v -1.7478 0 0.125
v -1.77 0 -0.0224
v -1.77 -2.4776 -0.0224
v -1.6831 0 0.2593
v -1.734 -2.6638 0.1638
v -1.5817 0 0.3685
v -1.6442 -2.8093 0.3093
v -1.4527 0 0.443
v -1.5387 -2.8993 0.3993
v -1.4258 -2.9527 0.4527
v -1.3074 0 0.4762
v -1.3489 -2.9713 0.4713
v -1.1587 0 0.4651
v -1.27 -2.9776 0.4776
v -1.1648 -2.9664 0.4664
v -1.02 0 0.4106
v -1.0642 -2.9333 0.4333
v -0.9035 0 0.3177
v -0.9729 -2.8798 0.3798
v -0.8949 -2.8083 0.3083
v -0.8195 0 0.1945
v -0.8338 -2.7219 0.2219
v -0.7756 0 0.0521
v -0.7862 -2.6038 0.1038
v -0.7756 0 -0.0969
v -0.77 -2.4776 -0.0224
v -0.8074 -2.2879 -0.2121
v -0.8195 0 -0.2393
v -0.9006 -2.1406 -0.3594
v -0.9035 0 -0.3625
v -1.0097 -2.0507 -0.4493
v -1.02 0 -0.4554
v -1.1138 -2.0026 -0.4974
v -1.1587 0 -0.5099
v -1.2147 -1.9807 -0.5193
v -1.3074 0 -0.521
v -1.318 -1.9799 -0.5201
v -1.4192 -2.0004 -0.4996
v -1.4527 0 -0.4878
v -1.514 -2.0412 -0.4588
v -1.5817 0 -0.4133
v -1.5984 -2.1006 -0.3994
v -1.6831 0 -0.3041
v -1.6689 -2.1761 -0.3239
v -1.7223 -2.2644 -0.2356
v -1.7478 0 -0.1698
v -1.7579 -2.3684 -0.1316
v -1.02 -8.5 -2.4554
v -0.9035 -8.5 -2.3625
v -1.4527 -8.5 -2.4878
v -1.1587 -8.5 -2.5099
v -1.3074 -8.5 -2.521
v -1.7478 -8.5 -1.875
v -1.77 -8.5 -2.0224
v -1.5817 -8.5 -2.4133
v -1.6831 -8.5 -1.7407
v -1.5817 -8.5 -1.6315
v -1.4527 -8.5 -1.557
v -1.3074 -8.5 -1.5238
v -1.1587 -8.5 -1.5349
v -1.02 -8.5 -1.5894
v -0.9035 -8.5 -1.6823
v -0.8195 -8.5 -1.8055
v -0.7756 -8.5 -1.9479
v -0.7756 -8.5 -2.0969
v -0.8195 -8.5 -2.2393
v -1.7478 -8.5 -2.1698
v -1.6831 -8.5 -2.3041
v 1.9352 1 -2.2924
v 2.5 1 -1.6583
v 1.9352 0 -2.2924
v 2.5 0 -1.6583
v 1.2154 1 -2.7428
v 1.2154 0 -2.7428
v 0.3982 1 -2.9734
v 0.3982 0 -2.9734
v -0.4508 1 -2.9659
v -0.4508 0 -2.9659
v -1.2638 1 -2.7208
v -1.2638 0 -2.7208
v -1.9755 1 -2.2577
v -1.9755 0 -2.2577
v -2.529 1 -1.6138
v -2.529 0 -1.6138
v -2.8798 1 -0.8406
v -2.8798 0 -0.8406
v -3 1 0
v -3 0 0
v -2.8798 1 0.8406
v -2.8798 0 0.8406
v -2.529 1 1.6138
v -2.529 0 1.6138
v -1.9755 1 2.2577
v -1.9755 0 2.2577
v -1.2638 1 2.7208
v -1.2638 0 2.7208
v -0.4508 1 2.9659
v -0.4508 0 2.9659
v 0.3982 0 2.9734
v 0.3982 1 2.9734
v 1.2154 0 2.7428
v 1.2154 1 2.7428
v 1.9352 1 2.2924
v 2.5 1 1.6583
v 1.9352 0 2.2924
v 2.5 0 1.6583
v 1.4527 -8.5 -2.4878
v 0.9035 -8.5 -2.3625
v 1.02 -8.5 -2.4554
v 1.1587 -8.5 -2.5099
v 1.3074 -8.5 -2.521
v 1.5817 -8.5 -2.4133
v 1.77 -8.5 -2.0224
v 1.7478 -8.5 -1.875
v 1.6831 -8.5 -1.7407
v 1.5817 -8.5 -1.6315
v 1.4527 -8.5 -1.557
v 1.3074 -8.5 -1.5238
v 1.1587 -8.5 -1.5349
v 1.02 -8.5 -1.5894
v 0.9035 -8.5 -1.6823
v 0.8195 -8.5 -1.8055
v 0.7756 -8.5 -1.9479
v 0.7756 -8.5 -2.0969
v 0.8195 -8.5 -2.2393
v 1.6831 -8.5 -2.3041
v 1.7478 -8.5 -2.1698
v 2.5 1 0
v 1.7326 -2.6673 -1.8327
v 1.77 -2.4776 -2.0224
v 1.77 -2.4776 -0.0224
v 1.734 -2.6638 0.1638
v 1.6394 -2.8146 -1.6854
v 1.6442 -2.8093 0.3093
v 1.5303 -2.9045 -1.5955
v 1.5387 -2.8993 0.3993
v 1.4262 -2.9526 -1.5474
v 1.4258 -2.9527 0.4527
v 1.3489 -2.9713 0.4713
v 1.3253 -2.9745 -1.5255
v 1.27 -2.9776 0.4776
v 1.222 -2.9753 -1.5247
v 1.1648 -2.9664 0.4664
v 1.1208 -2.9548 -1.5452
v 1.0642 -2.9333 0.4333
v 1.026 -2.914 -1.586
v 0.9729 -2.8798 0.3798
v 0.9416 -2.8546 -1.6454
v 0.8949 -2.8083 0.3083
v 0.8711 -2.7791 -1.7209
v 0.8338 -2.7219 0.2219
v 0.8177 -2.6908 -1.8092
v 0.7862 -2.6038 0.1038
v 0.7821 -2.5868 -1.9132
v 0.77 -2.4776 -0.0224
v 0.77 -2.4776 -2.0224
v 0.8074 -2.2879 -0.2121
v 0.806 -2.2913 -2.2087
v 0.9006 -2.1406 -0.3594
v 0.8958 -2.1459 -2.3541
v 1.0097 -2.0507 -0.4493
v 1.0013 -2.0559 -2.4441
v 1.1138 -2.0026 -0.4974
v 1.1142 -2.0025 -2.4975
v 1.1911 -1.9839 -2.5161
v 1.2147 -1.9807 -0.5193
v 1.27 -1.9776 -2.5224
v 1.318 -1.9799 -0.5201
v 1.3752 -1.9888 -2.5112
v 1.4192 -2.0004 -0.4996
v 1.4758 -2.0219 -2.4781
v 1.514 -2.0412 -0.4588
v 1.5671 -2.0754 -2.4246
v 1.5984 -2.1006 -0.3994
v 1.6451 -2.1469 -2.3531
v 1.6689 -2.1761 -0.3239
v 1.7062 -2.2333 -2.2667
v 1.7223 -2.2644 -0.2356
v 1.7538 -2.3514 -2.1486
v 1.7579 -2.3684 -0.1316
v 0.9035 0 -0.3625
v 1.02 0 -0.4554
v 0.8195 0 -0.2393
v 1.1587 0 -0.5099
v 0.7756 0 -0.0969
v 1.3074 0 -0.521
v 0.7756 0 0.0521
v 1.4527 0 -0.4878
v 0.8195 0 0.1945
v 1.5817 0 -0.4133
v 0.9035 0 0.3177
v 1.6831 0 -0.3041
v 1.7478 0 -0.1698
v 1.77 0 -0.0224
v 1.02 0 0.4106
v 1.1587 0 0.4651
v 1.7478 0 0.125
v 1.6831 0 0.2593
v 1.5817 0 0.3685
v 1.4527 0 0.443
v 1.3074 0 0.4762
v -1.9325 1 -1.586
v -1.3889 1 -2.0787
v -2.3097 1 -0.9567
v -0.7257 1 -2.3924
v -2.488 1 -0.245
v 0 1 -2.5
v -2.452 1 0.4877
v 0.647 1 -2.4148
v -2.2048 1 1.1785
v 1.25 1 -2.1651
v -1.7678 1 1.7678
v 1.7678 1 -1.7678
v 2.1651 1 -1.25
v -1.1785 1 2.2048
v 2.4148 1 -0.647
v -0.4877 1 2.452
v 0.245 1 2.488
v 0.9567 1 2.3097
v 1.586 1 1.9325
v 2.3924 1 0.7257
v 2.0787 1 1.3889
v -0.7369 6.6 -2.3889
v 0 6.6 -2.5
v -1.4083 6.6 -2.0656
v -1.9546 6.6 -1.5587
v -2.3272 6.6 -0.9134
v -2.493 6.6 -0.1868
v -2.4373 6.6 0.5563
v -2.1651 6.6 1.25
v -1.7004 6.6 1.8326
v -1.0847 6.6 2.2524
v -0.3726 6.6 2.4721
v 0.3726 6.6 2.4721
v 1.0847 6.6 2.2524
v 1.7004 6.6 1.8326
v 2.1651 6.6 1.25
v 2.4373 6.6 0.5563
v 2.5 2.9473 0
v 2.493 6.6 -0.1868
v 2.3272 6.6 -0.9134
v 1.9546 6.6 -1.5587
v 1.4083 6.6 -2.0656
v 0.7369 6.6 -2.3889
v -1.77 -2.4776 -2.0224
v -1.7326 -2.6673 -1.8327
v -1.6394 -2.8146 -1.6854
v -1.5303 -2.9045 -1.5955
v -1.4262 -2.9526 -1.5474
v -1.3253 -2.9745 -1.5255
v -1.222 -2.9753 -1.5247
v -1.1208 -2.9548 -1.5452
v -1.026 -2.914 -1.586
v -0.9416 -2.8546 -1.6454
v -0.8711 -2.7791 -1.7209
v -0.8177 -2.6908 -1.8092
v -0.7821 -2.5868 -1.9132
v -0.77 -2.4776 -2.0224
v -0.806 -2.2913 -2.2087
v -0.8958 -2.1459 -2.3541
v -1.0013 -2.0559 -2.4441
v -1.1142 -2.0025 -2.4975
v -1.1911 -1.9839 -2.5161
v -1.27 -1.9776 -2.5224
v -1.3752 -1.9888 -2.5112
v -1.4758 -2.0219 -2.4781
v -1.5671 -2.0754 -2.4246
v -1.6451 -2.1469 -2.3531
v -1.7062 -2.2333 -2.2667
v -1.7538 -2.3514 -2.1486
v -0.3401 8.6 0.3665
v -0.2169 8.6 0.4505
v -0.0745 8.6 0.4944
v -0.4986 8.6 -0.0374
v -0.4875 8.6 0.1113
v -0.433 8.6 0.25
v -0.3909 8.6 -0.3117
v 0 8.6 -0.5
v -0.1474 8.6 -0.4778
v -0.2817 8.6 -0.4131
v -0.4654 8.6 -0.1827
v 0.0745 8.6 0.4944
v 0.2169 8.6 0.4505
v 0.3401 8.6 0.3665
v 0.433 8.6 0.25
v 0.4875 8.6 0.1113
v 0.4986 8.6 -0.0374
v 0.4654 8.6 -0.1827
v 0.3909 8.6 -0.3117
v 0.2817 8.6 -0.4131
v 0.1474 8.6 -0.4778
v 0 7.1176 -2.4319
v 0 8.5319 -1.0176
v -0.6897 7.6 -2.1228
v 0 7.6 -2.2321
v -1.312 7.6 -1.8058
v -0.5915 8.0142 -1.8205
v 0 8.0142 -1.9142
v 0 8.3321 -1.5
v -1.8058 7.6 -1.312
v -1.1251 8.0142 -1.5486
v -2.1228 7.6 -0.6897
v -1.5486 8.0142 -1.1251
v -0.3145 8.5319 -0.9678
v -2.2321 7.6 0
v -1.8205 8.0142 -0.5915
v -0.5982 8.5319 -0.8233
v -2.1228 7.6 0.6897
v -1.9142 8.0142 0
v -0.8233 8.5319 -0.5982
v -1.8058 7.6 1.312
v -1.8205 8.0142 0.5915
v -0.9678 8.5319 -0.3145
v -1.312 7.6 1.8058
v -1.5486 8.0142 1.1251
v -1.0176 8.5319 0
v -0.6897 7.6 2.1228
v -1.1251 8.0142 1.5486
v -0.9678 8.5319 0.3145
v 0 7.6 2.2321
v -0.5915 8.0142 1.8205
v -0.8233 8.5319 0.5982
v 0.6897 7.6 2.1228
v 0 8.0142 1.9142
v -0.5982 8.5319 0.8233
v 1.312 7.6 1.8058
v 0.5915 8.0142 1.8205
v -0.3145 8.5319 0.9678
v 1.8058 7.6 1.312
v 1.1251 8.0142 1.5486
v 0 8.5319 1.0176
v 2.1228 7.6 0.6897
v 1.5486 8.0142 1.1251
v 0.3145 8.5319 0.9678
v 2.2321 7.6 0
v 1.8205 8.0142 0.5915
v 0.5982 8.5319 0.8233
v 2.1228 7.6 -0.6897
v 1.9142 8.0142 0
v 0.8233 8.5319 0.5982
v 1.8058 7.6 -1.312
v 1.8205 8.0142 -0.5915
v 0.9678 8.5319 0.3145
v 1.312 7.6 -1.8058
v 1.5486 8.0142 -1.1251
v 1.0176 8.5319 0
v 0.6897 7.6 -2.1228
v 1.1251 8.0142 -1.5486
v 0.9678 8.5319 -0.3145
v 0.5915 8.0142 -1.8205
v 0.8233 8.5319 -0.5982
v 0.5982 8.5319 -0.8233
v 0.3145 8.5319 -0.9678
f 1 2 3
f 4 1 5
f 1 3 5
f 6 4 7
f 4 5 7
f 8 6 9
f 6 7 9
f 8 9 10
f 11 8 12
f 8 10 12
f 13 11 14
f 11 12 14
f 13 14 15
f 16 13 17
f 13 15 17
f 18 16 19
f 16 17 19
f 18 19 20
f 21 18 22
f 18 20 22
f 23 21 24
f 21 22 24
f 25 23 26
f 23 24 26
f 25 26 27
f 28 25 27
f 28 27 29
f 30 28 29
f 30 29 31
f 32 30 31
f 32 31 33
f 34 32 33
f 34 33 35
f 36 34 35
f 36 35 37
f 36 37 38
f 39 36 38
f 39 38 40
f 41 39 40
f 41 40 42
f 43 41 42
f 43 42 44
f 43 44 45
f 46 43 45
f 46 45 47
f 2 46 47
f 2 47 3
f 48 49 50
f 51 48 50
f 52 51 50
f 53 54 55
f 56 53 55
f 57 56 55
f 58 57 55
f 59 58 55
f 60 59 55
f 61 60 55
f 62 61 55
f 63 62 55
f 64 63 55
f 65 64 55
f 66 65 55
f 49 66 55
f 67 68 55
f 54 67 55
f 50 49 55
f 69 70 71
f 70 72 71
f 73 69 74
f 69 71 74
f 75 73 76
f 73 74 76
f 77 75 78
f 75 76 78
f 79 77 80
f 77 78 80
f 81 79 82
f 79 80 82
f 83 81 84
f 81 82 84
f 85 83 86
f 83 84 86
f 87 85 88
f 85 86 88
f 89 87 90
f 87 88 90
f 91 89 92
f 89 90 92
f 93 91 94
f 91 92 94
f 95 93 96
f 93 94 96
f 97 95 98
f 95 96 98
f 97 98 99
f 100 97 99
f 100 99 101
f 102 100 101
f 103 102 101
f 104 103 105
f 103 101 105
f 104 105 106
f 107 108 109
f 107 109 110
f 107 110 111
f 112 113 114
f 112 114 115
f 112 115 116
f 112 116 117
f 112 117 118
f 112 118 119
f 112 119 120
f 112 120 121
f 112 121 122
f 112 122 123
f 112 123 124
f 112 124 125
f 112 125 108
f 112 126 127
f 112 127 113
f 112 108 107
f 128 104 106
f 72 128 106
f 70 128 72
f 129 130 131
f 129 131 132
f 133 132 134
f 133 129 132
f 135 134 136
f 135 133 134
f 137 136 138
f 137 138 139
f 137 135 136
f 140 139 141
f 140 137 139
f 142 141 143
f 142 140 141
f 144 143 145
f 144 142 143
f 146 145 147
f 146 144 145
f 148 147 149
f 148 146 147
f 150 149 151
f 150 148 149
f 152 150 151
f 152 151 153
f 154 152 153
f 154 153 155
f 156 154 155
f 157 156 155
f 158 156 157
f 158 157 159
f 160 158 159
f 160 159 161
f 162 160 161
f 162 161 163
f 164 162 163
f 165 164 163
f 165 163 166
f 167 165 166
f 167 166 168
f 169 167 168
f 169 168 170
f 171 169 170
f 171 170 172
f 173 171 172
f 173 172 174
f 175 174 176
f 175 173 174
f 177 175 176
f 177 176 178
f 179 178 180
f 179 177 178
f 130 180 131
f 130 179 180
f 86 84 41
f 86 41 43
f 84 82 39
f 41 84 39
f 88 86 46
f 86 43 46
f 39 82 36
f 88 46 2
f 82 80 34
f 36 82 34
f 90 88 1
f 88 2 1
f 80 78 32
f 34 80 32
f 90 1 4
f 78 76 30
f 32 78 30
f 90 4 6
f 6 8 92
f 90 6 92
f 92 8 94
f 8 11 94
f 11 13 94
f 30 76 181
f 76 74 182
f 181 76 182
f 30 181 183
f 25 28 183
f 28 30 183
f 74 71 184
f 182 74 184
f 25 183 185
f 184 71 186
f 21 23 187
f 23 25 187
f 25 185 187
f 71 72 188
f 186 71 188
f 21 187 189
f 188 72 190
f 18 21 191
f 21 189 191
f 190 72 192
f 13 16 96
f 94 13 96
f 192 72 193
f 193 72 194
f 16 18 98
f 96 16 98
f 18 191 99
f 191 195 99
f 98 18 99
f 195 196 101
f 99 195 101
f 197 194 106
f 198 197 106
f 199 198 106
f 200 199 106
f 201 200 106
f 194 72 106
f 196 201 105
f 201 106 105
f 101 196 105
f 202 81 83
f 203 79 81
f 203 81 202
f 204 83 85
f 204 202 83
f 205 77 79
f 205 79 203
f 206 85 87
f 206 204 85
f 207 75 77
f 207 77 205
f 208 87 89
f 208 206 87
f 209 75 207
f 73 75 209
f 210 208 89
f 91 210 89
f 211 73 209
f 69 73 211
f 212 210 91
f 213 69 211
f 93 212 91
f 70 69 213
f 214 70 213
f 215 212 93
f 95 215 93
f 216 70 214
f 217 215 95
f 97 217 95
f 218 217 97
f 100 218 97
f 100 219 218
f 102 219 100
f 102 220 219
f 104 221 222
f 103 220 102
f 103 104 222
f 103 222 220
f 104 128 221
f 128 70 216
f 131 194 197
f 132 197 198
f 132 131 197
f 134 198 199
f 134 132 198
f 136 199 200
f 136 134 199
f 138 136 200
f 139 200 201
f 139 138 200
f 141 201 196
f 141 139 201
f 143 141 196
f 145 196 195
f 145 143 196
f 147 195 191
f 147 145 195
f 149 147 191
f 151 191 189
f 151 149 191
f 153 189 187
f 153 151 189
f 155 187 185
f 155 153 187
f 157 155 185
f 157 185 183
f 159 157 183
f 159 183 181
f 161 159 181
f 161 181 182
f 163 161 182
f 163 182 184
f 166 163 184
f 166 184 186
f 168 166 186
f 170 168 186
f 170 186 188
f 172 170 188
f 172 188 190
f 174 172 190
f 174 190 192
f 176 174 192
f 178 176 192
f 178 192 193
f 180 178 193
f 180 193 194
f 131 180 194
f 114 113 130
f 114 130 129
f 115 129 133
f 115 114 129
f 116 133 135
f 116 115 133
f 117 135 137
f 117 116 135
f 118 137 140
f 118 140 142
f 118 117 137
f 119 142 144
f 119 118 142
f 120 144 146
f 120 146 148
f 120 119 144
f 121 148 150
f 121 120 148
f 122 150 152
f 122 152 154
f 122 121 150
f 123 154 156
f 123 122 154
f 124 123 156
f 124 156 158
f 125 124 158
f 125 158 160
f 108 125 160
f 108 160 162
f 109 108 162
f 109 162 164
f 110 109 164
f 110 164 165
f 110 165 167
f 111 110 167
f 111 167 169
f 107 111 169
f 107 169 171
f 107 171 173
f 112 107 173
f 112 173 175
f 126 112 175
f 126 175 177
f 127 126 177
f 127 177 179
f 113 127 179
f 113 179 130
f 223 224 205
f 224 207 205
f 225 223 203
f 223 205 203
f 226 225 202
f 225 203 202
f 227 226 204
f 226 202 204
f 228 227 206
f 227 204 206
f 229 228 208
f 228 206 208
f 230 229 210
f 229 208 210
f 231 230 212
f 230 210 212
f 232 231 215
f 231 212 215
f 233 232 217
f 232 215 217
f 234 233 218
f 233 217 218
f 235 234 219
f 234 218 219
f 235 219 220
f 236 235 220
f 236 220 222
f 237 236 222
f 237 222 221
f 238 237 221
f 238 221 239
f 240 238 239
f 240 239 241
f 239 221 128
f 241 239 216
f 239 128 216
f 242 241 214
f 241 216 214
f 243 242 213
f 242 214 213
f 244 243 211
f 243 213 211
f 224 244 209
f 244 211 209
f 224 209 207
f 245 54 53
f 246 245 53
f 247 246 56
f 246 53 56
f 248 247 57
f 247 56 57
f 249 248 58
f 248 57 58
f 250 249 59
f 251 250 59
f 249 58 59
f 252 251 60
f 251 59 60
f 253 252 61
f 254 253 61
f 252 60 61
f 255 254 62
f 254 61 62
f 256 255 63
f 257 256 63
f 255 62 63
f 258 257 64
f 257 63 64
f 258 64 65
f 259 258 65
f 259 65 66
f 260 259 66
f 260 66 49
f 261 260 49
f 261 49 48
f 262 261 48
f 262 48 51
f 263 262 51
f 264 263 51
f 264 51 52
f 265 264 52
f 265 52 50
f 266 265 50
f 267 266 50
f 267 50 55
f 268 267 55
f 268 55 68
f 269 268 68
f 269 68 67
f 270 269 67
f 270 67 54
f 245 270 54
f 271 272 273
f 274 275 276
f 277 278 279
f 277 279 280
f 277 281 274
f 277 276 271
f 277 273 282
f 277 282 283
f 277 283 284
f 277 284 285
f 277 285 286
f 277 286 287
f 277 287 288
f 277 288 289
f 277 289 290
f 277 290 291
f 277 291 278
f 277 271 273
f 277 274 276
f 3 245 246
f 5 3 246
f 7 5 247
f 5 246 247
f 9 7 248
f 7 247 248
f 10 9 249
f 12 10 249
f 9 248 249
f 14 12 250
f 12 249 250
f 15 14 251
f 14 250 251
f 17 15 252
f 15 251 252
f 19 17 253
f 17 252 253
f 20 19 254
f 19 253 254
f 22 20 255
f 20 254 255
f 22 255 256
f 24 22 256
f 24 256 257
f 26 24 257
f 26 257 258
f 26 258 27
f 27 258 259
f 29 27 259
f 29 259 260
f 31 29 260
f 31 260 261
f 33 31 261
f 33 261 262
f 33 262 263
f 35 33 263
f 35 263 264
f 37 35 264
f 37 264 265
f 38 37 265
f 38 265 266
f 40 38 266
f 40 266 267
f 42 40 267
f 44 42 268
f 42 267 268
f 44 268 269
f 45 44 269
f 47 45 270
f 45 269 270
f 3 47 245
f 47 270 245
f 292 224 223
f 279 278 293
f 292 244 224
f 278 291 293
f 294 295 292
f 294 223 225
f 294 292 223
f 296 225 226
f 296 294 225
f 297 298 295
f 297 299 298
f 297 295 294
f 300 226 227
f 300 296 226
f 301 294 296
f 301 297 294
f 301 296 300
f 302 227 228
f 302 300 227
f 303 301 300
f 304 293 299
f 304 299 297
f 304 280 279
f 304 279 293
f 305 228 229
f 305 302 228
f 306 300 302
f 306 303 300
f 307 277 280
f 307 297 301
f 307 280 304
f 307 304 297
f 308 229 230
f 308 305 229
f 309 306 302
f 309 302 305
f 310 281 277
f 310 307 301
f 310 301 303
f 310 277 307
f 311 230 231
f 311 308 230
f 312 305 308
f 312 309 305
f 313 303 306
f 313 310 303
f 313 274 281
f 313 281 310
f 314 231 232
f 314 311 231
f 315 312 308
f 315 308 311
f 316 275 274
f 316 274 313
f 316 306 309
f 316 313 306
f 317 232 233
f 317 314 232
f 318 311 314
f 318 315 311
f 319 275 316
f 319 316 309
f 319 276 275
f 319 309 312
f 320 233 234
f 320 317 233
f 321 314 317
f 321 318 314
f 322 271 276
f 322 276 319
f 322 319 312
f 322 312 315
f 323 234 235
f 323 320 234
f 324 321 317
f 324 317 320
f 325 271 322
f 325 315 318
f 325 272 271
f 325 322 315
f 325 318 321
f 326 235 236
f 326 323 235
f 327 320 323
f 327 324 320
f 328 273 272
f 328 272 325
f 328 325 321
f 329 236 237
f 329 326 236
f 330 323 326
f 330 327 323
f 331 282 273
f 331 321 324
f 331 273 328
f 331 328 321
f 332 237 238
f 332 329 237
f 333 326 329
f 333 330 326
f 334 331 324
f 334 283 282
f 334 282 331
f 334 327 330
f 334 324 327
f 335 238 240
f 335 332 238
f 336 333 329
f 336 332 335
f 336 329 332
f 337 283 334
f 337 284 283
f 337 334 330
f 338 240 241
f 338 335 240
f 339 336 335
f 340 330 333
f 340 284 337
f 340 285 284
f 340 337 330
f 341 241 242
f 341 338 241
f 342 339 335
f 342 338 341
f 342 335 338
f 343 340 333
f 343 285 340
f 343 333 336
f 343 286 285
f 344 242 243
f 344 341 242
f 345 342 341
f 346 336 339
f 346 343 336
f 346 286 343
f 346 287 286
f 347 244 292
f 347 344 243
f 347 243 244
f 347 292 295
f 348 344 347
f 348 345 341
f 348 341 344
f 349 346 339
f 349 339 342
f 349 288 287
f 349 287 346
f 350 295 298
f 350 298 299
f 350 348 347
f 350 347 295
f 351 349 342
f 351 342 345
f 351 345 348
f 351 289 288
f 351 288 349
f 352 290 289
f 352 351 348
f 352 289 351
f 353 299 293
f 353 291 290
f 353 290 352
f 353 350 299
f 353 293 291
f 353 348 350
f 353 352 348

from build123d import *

# Parameters (mm, degrees)
SCHIZZO1_R                   = 3
ESTRUSIONE_ESTRUSIONE1_DEPTH = 1
SCHIZZO2_R                   = 2.5
ESTRUSIONE_ESTRUSIONE2_DEPTH = 7.6
RACCORDO3_R                  = 2
SCHIZZO6_R                   = 0.5
SCHIZZO7_W                   = 4.951519697
SCHIZZO7_H                   = 4.598065652
TAGLIO_ESTRUSIONE1_DEPTH     = 10


with BuildPart() as part:
    # Schizzo1 → Estrusione-Estrusione1 (new body)
    with BuildSketch(Plane(origin=(0, 0, 0), x_dir=(1, 0, 0), z_dir=(0, 1, 0))):
        with Locations(Location((0, 0, 0), (0, 0, 270))):
            Circle(SCHIZZO1_R)
    extrude(amount=ESTRUSIONE_ESTRUSIONE1_DEPTH)

    # Schizzo2 → Estrusione-Estrusione2 (add)
    with BuildSketch(Plane(origin=(0, 1, 0), x_dir=(1, 0, 0), z_dir=(0, 1, 0))):
        with Locations(Location((0, 0, 0), (0, 0, 90))):
            Circle(SCHIZZO2_R)
    extrude(amount=ESTRUSIONE_ESTRUSIONE2_DEPTH)

    # Raccordo3
    raccordo3_edges = [part.edges().sort_by_distance(p)[0] for p in [
        (0, 8.6, 2.5),
    ]]
    fillet(raccordo3_edges, radius=RACCORDO3_R)

    # Sweep1: sweep along a path in Schizzo5
    with BuildLine(Plane(origin=(1.27, 0, 0), x_dir=(0, 0, -1), z_dir=(1, 0, 0))) as sweep1_path:
        Line((0, 0), (0, -2.5))
        Line((0, -2.5), (2, -2.5))
        Line((2, -2.5), (2, -8.5))
    # Schizzo6 → Sweep1 (sweep)
    with BuildSketch(Plane.XZ):
        with Locations((1.27, -0.022402078)):
            Circle(SCHIZZO6_R)
    sweep1 = sweep(path=sweep1_path.line, transition=Transition.RIGHT)

    # Specchia1: Sweep1 across plane
    add(sweep1.mirror(Plane(origin=(0, 0, 0), x_dir=(0, 0, 1), z_dir=(1, 0, 0))))

    # Schizzo7 → Taglio-Estrusione1 (cut)
    with BuildSketch(Plane(origin=(2.5, 0, 0), x_dir=(0, 0, -1), z_dir=(1, 0, 0))):
        with Locations((0.024240151, 0.648217725)):
            Rectangle(SCHIZZO7_W, SCHIZZO7_H)
    extrude(amount=TAGLIO_ESTRUSIONE1_DEPTH, mode=Mode.SUBTRACT)


solid = part.part
